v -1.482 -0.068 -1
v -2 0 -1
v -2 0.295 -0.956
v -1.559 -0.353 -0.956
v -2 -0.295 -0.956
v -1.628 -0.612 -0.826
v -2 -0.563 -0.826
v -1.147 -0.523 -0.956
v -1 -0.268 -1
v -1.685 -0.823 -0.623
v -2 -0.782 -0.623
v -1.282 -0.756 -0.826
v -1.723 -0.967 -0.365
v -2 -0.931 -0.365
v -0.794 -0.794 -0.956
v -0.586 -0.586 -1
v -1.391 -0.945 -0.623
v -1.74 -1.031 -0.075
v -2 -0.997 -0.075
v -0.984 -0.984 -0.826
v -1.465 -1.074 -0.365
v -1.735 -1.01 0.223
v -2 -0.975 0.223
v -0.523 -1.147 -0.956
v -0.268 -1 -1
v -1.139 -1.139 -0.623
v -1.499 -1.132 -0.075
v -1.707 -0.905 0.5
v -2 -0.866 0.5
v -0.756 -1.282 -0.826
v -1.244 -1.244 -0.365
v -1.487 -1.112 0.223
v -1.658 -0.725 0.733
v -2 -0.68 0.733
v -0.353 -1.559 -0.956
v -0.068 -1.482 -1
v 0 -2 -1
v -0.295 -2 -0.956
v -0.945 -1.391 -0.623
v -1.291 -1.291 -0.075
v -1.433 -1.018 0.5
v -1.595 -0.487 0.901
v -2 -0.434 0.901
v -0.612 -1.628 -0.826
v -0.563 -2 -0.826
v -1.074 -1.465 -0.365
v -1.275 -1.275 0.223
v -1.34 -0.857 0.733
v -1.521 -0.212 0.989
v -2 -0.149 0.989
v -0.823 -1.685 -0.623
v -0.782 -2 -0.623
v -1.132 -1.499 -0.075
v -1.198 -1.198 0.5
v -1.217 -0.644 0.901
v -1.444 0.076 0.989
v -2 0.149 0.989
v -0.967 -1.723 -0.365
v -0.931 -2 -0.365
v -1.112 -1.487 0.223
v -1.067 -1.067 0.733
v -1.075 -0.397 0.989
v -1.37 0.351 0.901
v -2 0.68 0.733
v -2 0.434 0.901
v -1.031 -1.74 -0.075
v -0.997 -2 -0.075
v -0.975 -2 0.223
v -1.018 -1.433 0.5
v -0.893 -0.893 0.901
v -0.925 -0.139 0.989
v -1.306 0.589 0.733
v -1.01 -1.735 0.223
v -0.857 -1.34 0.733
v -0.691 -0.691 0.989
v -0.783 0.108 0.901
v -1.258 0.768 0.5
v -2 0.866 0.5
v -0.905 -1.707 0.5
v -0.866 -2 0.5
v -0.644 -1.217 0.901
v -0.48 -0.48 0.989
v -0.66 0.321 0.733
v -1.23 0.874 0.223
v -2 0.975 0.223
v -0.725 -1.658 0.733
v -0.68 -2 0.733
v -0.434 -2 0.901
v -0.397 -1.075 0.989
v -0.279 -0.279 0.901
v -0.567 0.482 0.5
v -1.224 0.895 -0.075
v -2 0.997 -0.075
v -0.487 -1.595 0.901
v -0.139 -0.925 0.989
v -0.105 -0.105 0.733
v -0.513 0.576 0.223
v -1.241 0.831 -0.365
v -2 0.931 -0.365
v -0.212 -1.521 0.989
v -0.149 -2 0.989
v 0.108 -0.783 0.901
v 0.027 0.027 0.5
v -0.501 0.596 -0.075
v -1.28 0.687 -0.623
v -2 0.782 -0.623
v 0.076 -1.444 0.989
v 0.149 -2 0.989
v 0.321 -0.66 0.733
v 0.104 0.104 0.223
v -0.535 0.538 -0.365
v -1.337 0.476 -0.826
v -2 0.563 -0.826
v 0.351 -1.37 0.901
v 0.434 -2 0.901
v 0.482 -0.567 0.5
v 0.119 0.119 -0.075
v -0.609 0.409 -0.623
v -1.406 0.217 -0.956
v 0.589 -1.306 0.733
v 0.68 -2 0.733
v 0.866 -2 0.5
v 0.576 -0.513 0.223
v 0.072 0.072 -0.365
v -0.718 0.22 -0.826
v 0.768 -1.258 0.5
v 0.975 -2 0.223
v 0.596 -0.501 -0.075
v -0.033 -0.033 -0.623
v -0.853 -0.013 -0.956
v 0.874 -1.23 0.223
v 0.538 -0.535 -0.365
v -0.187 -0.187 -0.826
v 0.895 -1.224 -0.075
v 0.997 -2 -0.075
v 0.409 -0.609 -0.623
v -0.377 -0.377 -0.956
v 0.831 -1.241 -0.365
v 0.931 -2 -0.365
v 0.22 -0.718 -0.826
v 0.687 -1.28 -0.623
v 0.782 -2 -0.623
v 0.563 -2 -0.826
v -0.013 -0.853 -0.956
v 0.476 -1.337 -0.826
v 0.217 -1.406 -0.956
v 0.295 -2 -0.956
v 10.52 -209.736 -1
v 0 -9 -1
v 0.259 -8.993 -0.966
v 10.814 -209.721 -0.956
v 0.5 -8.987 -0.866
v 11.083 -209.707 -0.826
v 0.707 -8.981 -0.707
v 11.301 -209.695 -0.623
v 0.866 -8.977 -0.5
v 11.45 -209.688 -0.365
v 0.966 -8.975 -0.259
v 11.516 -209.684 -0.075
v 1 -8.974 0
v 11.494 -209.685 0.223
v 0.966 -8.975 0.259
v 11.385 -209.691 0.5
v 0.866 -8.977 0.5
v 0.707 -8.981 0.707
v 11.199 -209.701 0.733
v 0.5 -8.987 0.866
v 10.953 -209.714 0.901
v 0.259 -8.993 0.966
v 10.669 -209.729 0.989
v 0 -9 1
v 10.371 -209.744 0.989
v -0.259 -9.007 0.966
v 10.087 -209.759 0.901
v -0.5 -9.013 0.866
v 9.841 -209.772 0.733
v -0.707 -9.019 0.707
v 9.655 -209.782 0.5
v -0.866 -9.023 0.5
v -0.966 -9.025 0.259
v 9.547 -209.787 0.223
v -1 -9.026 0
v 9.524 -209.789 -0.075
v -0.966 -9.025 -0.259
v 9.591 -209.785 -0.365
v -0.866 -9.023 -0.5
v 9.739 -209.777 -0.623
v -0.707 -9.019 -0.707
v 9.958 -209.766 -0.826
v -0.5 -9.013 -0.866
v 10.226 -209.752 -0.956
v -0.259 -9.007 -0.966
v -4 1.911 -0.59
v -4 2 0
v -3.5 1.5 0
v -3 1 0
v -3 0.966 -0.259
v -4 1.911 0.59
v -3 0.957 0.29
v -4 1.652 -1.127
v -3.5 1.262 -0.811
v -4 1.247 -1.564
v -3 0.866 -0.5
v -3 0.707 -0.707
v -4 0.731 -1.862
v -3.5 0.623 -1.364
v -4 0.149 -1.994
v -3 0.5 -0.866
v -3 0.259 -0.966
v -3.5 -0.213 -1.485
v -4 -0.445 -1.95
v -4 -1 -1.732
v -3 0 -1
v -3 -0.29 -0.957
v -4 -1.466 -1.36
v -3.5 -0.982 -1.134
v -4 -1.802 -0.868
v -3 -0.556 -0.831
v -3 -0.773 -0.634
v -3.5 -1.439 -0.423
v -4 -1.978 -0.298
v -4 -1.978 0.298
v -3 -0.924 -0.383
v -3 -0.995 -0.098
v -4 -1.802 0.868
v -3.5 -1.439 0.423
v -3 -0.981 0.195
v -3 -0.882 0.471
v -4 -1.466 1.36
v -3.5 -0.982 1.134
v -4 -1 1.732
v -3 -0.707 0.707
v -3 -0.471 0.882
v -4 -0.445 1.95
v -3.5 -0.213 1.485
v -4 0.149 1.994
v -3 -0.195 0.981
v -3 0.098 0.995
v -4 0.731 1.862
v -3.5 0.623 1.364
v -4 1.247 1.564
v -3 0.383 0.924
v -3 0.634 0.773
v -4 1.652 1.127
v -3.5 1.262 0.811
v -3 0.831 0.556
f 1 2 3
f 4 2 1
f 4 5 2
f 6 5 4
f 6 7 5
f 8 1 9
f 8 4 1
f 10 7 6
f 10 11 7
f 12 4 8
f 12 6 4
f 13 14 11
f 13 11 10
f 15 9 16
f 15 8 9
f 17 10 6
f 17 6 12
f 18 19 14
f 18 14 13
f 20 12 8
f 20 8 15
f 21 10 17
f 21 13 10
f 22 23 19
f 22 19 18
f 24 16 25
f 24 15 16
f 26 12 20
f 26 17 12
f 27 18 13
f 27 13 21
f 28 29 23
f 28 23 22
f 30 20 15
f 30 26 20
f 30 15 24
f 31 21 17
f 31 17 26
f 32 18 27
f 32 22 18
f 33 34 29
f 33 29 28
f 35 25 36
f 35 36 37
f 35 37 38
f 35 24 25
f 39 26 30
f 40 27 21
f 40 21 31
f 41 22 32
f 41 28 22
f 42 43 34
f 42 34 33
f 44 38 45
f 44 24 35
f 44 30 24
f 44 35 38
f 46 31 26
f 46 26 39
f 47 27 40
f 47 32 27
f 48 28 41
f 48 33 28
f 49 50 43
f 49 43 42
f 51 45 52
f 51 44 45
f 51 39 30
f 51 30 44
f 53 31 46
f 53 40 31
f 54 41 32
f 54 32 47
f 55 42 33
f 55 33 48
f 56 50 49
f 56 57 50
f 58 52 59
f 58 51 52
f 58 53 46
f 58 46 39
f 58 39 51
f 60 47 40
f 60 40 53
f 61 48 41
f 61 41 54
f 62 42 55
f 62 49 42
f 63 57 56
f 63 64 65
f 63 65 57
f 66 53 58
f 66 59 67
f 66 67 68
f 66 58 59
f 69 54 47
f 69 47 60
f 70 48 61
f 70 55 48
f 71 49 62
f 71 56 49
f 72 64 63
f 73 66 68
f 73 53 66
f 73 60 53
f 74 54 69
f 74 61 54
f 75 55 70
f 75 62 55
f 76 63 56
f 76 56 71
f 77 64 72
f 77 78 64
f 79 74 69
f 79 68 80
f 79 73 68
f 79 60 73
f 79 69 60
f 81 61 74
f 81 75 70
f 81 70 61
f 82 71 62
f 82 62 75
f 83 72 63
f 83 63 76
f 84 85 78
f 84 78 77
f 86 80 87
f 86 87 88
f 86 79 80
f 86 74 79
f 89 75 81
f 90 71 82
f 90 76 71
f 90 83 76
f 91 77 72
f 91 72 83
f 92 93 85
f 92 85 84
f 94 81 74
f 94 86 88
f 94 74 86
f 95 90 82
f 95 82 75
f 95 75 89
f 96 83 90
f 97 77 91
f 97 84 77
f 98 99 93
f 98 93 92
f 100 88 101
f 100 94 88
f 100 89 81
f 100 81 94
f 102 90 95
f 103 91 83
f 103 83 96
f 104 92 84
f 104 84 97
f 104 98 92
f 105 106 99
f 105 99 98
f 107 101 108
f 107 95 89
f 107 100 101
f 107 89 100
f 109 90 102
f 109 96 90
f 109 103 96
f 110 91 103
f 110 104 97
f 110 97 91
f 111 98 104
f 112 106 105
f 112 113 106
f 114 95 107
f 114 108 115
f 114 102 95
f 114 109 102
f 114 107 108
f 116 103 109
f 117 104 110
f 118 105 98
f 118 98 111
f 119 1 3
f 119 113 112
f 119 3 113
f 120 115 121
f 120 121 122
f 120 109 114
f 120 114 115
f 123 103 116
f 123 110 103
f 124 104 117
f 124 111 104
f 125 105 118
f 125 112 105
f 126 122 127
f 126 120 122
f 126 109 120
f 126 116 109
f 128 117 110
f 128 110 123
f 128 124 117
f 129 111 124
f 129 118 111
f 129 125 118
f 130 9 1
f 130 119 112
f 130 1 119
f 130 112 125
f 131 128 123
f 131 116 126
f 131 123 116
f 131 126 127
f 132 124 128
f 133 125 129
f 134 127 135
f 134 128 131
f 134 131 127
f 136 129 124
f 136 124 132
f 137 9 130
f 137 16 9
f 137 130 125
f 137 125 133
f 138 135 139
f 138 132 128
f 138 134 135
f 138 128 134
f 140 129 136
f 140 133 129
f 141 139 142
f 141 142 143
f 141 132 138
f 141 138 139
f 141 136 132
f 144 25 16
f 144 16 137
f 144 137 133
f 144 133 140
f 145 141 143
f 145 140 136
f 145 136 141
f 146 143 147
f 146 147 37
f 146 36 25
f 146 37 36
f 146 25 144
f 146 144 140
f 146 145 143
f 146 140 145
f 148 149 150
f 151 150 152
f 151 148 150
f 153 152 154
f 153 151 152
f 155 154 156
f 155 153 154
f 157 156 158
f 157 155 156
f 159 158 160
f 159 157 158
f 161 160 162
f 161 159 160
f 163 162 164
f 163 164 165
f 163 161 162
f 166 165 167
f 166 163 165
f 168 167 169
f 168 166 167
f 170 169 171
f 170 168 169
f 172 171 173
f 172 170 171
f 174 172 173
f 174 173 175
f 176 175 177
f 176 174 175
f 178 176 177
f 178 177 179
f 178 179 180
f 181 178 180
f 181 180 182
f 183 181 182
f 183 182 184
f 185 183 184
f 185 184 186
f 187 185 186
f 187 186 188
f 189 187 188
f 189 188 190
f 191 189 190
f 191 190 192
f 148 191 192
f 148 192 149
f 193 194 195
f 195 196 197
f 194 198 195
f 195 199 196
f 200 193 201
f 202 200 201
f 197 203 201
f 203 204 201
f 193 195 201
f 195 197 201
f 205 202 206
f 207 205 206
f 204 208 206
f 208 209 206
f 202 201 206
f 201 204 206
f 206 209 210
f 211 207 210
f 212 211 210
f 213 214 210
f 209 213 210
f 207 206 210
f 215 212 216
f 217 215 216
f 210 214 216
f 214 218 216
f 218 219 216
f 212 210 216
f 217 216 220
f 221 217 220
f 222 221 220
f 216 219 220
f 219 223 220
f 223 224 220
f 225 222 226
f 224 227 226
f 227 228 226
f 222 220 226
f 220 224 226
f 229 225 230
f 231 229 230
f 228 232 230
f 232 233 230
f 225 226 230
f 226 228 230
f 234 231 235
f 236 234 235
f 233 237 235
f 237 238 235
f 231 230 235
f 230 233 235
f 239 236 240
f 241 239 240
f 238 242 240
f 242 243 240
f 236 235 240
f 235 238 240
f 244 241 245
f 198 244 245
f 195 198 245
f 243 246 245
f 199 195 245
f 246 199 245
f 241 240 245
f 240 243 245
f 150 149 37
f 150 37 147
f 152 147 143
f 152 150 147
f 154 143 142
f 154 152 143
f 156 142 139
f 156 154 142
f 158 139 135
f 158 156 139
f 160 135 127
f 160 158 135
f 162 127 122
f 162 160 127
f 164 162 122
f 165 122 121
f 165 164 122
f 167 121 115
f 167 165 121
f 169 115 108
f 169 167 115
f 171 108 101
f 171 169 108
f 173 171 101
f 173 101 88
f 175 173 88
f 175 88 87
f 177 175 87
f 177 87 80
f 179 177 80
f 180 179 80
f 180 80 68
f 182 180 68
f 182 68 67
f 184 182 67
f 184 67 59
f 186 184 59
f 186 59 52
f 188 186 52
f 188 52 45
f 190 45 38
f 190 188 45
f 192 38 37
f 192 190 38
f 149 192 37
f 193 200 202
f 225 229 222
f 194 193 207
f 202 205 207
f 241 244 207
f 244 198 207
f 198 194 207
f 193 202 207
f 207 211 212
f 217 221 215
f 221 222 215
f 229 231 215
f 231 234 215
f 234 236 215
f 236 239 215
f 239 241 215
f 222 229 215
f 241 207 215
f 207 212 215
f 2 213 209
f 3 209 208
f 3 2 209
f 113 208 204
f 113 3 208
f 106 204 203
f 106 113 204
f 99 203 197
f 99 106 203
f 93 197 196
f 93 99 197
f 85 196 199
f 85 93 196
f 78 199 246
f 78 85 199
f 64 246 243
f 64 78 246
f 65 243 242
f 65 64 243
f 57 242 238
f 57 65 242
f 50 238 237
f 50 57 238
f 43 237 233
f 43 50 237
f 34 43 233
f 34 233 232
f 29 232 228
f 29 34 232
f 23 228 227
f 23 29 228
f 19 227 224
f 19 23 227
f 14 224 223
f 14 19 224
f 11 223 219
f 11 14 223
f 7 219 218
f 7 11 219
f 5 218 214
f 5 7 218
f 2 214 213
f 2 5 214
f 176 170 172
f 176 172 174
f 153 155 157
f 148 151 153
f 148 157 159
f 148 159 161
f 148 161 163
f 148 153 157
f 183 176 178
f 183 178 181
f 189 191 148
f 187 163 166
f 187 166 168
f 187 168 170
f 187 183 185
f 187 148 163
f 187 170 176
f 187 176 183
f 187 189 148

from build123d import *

# Parameters (mm, degrees)
ESQUISSE2_R = 1


with BuildPart() as part:
    # Balayage1: sweep along a path in Esquisse1
    with BuildLine(Plane.XY) as balayage1_path:
        Line((-4, 0), (-2, 0))
        ThreePointArc((-2, 0), (-0.585786438, -0.585786438), (0, -2))
        Line((0, -2), (0, -9))
        Line((0, -9), (10.52014508, -209.736326247))
    # Esquisse2 → Balayage1 (sweep)
    with BuildSketch(Plane(origin=(-4, 0, 0), x_dir=(0, 0, -1), z_dir=(1, 0, 0))):
        Circle(ESQUISSE2_R)
    sweep(path=balayage1_path.line, transition=Transition.RIGHT)

    # Esquisse3 → Révolution1 (revolve)
    with BuildSketch(Plane.XY):
        Polygon((-4, 1), (-4, 2), (-3, 1), align=None)
    revolve(axis=Axis((0, 0, 0), (-1, 0, 0)))


solid = part.part
